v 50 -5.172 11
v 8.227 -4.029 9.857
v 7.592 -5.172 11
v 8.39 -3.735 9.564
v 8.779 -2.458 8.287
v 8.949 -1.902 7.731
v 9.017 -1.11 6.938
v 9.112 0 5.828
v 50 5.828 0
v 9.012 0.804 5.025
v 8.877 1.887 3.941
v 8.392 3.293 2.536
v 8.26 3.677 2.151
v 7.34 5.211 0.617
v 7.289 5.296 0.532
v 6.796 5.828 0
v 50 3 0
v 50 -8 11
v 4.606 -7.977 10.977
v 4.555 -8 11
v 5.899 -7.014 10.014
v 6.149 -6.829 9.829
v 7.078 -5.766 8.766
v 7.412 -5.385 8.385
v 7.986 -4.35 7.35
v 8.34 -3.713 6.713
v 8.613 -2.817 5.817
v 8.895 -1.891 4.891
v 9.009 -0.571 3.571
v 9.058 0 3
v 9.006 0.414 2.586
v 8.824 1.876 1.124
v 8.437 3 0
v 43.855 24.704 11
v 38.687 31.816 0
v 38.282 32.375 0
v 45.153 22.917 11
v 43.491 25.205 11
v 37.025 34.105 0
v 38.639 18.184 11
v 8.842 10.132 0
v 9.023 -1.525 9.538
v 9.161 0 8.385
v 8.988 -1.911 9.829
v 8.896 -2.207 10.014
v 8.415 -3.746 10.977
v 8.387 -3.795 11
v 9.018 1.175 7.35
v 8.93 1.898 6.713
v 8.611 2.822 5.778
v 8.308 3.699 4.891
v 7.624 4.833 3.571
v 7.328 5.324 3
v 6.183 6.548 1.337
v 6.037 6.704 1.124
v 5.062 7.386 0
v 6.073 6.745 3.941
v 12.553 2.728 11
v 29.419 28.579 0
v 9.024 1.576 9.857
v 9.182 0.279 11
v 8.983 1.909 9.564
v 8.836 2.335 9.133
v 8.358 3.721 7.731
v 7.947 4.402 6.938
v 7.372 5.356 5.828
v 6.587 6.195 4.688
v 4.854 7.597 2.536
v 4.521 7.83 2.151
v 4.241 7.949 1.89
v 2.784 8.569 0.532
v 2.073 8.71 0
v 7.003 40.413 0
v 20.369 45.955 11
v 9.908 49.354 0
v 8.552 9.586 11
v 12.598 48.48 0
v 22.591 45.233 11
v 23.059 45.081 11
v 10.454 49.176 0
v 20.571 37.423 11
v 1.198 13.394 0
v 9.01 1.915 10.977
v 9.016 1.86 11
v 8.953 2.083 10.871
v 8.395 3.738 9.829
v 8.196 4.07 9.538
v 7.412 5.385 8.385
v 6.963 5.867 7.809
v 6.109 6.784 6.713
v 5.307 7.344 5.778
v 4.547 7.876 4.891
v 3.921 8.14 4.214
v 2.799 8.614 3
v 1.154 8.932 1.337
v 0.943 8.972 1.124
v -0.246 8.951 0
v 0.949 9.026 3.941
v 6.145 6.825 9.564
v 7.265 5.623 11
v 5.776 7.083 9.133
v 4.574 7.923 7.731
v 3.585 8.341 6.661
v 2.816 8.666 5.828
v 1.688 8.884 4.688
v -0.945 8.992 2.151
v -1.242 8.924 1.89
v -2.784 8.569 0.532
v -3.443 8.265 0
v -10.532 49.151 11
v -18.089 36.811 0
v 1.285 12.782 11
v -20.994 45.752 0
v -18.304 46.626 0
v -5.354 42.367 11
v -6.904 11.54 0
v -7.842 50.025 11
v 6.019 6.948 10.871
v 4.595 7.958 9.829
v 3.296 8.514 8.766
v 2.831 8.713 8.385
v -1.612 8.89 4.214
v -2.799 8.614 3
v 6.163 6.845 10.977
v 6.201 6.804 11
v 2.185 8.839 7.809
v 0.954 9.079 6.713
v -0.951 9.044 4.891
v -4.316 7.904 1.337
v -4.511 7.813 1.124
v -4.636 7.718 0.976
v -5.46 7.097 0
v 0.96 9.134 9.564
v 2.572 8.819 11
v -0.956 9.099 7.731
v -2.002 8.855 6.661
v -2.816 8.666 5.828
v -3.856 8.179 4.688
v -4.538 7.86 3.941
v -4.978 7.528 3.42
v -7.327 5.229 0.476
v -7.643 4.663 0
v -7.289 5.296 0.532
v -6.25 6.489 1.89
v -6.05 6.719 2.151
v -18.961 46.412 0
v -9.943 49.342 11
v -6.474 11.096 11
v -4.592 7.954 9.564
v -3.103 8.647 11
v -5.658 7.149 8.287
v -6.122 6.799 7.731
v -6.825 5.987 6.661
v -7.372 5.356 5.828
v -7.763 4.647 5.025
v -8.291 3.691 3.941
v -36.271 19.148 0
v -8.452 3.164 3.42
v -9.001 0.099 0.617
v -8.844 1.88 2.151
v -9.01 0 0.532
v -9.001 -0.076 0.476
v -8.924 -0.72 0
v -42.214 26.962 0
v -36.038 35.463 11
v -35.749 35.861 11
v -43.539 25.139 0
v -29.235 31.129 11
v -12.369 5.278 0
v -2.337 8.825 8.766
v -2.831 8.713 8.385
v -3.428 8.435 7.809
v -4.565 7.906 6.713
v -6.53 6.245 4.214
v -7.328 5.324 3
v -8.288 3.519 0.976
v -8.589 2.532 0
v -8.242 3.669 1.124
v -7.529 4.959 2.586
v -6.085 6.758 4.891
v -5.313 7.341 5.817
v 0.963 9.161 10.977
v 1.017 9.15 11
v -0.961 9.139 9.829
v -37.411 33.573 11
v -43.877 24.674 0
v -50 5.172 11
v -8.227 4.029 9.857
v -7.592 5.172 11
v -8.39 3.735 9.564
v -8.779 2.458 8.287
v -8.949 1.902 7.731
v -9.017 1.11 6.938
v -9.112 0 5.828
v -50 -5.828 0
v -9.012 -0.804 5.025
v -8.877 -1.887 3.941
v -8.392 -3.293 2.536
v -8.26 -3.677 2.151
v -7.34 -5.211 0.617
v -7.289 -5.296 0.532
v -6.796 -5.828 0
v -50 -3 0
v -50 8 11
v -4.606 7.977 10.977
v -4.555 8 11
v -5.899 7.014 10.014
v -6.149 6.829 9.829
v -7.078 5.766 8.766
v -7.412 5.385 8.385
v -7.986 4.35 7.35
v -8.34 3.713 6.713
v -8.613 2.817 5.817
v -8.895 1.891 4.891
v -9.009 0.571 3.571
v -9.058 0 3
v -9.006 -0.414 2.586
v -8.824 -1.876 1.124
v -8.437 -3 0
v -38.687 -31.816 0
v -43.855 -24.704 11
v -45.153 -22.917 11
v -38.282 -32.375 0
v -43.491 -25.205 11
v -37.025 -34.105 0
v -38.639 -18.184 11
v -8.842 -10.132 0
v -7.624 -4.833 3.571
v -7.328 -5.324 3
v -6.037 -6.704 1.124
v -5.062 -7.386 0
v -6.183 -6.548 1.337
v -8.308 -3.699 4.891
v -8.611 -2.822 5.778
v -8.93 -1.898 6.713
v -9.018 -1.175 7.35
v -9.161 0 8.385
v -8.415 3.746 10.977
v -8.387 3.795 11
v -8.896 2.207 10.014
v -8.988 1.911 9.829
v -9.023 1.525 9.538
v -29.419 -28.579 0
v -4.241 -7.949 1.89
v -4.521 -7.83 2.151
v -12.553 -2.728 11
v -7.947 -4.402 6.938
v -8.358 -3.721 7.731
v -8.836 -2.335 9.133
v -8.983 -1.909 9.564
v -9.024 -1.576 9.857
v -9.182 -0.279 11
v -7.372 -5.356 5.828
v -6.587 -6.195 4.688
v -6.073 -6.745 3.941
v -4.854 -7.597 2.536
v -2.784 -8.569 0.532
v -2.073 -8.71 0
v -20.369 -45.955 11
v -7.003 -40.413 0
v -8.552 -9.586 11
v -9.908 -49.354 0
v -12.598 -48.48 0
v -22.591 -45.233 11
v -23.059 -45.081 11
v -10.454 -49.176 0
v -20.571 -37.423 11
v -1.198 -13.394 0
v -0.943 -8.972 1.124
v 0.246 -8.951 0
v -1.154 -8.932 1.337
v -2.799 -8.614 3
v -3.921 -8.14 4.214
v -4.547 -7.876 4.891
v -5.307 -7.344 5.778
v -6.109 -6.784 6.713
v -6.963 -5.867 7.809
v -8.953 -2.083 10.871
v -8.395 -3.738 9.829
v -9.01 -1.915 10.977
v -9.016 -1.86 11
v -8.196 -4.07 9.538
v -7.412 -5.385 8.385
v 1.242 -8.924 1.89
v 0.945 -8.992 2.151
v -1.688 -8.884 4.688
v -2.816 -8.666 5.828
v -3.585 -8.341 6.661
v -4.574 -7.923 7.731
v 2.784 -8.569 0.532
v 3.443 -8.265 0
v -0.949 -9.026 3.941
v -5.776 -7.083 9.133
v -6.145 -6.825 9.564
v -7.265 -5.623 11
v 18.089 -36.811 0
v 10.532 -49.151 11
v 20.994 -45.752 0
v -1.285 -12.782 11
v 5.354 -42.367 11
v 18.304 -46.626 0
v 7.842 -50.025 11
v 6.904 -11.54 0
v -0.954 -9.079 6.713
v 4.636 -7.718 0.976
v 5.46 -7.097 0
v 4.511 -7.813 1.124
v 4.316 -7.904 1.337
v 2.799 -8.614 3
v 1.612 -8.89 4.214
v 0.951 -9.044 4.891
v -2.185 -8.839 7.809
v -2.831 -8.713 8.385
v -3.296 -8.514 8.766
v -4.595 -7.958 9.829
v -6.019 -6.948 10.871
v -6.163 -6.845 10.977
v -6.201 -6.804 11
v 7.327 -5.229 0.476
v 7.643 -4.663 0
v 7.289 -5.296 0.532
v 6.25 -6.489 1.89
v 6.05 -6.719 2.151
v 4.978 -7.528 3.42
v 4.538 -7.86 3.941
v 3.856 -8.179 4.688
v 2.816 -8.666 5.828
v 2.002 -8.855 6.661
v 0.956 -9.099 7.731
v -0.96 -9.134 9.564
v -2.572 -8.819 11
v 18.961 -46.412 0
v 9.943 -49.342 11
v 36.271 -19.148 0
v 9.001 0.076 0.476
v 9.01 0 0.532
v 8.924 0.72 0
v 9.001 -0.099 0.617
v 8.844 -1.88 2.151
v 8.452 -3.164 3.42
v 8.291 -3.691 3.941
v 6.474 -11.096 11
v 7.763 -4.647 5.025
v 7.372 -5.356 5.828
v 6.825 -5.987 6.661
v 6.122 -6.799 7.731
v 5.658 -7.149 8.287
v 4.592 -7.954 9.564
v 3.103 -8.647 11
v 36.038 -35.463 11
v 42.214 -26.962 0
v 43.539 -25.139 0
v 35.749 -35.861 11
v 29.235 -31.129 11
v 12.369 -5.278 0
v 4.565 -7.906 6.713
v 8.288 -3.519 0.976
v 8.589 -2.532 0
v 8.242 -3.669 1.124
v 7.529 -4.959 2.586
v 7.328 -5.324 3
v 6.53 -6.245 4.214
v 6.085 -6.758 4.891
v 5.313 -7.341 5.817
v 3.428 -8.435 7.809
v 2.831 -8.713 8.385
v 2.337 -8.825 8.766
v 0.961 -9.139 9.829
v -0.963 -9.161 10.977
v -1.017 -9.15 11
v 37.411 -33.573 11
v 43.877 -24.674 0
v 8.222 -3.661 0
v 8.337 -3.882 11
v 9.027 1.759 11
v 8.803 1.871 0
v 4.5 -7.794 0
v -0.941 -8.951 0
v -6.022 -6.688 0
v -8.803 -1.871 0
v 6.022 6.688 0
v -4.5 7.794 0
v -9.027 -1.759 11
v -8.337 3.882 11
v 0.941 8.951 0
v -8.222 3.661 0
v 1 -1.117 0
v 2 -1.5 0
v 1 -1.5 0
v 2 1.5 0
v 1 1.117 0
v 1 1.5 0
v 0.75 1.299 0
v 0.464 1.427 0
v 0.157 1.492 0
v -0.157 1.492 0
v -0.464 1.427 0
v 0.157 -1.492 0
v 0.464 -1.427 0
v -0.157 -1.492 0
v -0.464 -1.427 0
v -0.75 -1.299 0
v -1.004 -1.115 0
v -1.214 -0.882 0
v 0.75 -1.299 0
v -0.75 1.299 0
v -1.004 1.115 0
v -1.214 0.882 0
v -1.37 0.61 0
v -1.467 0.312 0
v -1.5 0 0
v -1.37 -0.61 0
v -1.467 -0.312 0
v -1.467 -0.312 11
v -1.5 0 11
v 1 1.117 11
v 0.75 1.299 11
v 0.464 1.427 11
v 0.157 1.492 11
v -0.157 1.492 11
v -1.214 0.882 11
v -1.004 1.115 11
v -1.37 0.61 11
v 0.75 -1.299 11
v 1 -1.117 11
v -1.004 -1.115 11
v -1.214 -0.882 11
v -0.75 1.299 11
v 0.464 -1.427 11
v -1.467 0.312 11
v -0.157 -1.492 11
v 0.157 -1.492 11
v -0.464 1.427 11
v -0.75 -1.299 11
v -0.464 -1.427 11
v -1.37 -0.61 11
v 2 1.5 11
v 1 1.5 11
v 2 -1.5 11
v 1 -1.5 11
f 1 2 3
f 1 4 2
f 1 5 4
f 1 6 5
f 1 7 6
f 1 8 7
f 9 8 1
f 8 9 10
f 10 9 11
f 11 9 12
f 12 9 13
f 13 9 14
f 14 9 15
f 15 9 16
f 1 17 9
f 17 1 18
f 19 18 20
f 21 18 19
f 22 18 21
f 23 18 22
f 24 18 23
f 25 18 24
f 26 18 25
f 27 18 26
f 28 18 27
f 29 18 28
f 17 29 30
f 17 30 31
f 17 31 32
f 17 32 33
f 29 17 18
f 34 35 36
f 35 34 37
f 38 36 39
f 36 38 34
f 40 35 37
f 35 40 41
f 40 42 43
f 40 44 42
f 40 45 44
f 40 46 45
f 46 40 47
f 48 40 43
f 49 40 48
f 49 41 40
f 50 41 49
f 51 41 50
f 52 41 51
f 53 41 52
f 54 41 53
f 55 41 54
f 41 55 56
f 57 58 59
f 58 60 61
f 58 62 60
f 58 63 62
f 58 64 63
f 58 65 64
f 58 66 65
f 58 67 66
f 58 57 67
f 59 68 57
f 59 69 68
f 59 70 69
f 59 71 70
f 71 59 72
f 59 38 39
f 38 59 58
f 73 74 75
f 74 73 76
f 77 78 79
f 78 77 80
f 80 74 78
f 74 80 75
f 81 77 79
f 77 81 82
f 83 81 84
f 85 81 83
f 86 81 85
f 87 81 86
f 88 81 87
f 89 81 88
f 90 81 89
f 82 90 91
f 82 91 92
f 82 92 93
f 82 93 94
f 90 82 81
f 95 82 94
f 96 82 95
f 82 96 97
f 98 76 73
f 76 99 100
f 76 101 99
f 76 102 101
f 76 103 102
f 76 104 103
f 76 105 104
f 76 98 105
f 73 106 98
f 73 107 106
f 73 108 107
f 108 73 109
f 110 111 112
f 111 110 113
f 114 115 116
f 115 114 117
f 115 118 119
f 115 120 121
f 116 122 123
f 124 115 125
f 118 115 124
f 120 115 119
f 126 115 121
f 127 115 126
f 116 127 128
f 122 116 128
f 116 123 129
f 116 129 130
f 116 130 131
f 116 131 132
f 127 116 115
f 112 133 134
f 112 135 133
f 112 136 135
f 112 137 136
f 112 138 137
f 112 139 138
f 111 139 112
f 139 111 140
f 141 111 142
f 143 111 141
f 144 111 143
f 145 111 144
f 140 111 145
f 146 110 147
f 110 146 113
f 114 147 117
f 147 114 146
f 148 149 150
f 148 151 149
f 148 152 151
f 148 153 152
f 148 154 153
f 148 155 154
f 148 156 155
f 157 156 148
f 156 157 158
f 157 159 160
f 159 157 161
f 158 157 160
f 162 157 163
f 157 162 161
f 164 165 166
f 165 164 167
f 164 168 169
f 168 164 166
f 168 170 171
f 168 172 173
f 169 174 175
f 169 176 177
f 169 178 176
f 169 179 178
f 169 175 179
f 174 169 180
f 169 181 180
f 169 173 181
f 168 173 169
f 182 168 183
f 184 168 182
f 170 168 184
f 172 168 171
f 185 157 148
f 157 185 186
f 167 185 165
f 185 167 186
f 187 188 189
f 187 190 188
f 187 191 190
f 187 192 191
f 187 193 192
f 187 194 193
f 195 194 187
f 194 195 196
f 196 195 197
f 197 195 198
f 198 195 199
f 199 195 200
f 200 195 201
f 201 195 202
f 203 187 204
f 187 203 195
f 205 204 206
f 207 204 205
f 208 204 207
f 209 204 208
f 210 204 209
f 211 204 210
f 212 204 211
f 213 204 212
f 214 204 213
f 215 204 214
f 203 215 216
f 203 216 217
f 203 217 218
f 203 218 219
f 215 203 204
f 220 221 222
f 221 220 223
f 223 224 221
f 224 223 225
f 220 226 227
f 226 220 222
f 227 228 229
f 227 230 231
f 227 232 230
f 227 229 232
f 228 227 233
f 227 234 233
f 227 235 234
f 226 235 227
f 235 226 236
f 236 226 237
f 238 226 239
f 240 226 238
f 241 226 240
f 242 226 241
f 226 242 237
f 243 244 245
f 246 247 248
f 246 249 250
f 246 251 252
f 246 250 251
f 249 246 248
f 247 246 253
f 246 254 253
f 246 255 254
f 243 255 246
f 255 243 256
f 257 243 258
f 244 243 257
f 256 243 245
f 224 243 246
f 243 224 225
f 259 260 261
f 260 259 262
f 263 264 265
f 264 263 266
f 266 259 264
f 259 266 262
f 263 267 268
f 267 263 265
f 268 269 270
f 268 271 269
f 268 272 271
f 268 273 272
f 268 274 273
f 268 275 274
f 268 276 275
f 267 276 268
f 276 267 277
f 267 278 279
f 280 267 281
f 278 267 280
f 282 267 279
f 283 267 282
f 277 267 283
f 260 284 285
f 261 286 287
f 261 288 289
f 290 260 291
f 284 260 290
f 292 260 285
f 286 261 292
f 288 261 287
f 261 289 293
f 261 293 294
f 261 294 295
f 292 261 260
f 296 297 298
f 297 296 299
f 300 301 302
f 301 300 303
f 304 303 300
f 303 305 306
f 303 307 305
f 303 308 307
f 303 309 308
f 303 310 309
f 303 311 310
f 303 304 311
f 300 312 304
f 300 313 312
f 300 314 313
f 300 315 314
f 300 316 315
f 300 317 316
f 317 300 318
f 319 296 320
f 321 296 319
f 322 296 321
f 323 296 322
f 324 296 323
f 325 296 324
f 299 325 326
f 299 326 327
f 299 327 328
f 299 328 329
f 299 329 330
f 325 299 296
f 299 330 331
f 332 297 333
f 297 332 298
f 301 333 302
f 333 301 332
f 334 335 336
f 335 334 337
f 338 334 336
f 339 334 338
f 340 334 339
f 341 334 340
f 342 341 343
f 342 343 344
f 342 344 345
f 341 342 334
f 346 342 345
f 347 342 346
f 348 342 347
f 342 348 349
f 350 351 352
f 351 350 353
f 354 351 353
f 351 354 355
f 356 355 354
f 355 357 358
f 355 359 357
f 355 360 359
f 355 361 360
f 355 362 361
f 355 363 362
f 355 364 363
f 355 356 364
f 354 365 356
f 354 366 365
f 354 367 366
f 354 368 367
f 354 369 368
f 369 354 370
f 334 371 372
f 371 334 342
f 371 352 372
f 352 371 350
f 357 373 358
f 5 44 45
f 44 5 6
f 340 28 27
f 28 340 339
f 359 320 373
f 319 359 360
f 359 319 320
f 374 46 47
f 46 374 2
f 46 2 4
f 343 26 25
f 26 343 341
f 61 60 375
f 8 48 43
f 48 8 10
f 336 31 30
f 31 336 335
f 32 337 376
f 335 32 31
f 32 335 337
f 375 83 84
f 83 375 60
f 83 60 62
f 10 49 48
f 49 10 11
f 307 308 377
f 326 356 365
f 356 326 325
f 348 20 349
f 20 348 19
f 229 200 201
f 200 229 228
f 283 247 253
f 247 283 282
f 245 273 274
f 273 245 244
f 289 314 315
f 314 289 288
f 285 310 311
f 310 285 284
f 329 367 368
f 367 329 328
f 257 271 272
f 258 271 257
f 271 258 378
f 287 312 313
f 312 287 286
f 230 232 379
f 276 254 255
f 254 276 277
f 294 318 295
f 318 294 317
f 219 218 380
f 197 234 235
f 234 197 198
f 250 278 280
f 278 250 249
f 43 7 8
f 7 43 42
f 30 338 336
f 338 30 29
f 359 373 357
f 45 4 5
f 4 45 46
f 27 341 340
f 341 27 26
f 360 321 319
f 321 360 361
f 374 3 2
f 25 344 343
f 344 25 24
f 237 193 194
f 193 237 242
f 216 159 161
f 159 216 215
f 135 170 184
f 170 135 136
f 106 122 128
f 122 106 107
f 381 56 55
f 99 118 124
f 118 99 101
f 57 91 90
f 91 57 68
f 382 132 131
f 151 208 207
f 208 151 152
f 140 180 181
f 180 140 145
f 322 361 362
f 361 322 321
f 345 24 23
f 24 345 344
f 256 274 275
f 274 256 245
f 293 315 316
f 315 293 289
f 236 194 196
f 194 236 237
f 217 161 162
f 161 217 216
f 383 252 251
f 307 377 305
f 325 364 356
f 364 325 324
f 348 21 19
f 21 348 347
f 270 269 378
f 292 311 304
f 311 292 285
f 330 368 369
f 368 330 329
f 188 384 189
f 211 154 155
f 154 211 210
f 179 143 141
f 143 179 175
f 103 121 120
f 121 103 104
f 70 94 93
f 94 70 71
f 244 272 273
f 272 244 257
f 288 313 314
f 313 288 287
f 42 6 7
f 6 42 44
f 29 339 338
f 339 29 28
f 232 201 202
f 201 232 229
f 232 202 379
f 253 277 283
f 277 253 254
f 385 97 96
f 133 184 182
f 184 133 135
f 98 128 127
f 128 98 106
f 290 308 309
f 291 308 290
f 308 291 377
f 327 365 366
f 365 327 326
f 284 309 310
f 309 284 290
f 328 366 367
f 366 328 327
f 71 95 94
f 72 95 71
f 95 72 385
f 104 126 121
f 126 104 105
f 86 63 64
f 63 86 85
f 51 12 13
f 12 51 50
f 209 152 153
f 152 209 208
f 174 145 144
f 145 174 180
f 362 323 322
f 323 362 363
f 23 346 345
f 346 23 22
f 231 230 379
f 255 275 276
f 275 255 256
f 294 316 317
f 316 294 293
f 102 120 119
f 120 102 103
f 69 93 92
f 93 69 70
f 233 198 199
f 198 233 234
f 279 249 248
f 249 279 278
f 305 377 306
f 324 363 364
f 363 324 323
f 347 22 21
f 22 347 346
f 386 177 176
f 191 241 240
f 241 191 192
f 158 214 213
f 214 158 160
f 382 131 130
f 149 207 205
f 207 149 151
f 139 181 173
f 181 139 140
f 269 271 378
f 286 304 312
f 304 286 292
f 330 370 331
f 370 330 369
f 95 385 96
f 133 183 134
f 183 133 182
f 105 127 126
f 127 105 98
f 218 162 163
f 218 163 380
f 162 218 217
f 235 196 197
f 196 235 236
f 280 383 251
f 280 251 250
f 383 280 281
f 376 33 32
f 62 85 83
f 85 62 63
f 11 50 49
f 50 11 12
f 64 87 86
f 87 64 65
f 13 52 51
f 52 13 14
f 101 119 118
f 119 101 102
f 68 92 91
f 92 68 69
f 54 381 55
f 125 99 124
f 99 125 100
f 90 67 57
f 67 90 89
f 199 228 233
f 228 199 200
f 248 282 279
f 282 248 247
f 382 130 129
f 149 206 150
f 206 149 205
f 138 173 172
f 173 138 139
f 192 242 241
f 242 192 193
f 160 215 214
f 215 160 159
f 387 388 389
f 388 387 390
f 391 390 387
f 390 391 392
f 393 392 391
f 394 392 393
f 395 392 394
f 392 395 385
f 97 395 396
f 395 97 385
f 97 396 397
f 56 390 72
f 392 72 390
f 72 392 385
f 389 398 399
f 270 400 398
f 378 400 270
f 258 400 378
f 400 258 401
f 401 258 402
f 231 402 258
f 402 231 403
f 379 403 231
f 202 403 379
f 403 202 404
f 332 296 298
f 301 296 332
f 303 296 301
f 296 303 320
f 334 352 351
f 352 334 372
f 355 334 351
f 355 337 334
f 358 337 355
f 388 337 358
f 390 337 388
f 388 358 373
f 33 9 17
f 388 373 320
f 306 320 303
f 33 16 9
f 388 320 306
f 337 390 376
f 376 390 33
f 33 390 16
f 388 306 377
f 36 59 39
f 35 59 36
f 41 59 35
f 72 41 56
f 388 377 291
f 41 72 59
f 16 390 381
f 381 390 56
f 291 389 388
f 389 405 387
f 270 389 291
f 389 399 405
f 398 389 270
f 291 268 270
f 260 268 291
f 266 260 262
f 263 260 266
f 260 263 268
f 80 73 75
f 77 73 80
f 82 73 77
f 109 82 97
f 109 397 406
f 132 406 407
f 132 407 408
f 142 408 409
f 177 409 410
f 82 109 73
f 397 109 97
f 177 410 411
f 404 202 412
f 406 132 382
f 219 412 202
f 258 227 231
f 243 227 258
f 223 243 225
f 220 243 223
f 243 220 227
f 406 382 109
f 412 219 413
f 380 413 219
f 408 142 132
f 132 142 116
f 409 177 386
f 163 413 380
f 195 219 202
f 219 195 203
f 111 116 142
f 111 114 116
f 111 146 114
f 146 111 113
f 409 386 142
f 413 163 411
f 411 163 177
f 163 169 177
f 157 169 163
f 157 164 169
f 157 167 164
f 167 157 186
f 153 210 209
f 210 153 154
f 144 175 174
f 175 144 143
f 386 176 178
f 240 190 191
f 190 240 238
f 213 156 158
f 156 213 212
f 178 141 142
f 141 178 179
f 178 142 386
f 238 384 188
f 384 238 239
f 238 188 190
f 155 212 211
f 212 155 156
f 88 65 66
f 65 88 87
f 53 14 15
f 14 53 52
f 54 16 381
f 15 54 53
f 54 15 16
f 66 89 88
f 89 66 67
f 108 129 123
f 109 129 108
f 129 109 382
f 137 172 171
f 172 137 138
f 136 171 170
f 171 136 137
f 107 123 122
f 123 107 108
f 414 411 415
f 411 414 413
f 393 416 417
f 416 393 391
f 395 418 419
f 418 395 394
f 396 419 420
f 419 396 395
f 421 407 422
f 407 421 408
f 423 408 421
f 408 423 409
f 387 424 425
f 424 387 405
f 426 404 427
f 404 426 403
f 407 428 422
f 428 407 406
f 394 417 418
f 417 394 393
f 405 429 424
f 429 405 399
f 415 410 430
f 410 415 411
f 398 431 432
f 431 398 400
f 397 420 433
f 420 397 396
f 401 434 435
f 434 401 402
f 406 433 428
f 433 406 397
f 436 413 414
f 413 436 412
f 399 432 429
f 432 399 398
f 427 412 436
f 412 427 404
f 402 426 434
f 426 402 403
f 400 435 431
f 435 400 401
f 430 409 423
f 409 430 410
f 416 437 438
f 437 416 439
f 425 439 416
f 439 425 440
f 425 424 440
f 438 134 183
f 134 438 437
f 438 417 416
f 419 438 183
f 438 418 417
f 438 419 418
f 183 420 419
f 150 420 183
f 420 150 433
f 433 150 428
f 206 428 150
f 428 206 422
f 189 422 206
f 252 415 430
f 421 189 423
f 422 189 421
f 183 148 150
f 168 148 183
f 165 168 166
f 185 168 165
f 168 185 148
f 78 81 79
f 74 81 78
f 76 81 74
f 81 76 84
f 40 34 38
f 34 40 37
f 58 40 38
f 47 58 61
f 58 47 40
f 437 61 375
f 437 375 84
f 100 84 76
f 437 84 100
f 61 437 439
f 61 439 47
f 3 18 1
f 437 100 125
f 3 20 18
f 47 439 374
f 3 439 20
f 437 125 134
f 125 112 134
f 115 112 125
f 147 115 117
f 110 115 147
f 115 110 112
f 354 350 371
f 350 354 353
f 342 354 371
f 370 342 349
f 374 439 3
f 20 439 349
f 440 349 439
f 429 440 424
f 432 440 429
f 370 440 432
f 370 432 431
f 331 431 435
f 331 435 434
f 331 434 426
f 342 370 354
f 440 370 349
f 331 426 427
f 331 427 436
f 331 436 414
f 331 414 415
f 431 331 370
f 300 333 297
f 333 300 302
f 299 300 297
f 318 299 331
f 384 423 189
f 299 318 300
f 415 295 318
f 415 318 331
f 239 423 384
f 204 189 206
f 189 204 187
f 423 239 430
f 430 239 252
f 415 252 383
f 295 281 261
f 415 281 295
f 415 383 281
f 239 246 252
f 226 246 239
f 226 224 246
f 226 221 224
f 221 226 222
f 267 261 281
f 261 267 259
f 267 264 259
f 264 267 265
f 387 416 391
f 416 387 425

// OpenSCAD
// preview[view:north east, tilt:top diagonal]

// How many blades?
blades = 10; // [1:1:75]

// Length of blades
length = 50; // [1:1:300]

// Depth of propeller
depth = 12; // [1:1:75]

// How thick shall the blades be?
t = 2; // [0.1:0.1:7]

// Center hole for the shaft
shaft = 3; // [0:0.1:20]

// Do you want one flat side in the shaft hole?
cut = 1; // [1:Yes,0:No]

/* [Hidden] */
angle = 45;

difference() {   
    ///////////////////////
    // Draw these things //
    ///////////////////////
    union(){
        for (rotation =[0:360/blades:360]) {
            rotate([0,0,rotation]) {
                translate([0,8,-5]) {
                    rotate([angle,0,0]) {
                        // Draw blades
                        cube([length, t, depth/sin(angle)+10],false);
                    } // End rotate
                } // End translate       
            } // End rotate
        } // End for spaceW

    if (depth>20) {
        // Draw center cylinder for deep propellers
        cylinder(h=depth, r1=depth/4, r2=depth/3, center=false, $fn=40);
        } else {
        // Draw center cylinder for shallow propellers
        cylinder(h=depth, r1=9, r2=depth/1.3, center=false, $fn=30); 
        } // End else
    } // End union

    ///////////////////////////
    // Cut away these things //
    ///////////////////////////

    // Draw shaft hole
    translate([0,0,-1]) {
        cylinder(h=depth+1, r1=shaft/2, r2=shaft/2, center=false, $fn=30);
    } // End translate

    // Cut away bottom
    translate([0,0,-5]) {
        cube([1000, 1000, 10],true);
    } // End translate

    // Cut away top
    translate([-500,-500,depth-1]) {
        cube([1000, 1000, 10],false);
    } // End translate

} // End difference

// Draw extra part in shaft hole if cut is choosen
if (cut==1) {
    translate([shaft/3,-shaft/2,0]) {
        cube([shaft/3, shaft, depth-1],false);
    } // End translate
} // End if cut
